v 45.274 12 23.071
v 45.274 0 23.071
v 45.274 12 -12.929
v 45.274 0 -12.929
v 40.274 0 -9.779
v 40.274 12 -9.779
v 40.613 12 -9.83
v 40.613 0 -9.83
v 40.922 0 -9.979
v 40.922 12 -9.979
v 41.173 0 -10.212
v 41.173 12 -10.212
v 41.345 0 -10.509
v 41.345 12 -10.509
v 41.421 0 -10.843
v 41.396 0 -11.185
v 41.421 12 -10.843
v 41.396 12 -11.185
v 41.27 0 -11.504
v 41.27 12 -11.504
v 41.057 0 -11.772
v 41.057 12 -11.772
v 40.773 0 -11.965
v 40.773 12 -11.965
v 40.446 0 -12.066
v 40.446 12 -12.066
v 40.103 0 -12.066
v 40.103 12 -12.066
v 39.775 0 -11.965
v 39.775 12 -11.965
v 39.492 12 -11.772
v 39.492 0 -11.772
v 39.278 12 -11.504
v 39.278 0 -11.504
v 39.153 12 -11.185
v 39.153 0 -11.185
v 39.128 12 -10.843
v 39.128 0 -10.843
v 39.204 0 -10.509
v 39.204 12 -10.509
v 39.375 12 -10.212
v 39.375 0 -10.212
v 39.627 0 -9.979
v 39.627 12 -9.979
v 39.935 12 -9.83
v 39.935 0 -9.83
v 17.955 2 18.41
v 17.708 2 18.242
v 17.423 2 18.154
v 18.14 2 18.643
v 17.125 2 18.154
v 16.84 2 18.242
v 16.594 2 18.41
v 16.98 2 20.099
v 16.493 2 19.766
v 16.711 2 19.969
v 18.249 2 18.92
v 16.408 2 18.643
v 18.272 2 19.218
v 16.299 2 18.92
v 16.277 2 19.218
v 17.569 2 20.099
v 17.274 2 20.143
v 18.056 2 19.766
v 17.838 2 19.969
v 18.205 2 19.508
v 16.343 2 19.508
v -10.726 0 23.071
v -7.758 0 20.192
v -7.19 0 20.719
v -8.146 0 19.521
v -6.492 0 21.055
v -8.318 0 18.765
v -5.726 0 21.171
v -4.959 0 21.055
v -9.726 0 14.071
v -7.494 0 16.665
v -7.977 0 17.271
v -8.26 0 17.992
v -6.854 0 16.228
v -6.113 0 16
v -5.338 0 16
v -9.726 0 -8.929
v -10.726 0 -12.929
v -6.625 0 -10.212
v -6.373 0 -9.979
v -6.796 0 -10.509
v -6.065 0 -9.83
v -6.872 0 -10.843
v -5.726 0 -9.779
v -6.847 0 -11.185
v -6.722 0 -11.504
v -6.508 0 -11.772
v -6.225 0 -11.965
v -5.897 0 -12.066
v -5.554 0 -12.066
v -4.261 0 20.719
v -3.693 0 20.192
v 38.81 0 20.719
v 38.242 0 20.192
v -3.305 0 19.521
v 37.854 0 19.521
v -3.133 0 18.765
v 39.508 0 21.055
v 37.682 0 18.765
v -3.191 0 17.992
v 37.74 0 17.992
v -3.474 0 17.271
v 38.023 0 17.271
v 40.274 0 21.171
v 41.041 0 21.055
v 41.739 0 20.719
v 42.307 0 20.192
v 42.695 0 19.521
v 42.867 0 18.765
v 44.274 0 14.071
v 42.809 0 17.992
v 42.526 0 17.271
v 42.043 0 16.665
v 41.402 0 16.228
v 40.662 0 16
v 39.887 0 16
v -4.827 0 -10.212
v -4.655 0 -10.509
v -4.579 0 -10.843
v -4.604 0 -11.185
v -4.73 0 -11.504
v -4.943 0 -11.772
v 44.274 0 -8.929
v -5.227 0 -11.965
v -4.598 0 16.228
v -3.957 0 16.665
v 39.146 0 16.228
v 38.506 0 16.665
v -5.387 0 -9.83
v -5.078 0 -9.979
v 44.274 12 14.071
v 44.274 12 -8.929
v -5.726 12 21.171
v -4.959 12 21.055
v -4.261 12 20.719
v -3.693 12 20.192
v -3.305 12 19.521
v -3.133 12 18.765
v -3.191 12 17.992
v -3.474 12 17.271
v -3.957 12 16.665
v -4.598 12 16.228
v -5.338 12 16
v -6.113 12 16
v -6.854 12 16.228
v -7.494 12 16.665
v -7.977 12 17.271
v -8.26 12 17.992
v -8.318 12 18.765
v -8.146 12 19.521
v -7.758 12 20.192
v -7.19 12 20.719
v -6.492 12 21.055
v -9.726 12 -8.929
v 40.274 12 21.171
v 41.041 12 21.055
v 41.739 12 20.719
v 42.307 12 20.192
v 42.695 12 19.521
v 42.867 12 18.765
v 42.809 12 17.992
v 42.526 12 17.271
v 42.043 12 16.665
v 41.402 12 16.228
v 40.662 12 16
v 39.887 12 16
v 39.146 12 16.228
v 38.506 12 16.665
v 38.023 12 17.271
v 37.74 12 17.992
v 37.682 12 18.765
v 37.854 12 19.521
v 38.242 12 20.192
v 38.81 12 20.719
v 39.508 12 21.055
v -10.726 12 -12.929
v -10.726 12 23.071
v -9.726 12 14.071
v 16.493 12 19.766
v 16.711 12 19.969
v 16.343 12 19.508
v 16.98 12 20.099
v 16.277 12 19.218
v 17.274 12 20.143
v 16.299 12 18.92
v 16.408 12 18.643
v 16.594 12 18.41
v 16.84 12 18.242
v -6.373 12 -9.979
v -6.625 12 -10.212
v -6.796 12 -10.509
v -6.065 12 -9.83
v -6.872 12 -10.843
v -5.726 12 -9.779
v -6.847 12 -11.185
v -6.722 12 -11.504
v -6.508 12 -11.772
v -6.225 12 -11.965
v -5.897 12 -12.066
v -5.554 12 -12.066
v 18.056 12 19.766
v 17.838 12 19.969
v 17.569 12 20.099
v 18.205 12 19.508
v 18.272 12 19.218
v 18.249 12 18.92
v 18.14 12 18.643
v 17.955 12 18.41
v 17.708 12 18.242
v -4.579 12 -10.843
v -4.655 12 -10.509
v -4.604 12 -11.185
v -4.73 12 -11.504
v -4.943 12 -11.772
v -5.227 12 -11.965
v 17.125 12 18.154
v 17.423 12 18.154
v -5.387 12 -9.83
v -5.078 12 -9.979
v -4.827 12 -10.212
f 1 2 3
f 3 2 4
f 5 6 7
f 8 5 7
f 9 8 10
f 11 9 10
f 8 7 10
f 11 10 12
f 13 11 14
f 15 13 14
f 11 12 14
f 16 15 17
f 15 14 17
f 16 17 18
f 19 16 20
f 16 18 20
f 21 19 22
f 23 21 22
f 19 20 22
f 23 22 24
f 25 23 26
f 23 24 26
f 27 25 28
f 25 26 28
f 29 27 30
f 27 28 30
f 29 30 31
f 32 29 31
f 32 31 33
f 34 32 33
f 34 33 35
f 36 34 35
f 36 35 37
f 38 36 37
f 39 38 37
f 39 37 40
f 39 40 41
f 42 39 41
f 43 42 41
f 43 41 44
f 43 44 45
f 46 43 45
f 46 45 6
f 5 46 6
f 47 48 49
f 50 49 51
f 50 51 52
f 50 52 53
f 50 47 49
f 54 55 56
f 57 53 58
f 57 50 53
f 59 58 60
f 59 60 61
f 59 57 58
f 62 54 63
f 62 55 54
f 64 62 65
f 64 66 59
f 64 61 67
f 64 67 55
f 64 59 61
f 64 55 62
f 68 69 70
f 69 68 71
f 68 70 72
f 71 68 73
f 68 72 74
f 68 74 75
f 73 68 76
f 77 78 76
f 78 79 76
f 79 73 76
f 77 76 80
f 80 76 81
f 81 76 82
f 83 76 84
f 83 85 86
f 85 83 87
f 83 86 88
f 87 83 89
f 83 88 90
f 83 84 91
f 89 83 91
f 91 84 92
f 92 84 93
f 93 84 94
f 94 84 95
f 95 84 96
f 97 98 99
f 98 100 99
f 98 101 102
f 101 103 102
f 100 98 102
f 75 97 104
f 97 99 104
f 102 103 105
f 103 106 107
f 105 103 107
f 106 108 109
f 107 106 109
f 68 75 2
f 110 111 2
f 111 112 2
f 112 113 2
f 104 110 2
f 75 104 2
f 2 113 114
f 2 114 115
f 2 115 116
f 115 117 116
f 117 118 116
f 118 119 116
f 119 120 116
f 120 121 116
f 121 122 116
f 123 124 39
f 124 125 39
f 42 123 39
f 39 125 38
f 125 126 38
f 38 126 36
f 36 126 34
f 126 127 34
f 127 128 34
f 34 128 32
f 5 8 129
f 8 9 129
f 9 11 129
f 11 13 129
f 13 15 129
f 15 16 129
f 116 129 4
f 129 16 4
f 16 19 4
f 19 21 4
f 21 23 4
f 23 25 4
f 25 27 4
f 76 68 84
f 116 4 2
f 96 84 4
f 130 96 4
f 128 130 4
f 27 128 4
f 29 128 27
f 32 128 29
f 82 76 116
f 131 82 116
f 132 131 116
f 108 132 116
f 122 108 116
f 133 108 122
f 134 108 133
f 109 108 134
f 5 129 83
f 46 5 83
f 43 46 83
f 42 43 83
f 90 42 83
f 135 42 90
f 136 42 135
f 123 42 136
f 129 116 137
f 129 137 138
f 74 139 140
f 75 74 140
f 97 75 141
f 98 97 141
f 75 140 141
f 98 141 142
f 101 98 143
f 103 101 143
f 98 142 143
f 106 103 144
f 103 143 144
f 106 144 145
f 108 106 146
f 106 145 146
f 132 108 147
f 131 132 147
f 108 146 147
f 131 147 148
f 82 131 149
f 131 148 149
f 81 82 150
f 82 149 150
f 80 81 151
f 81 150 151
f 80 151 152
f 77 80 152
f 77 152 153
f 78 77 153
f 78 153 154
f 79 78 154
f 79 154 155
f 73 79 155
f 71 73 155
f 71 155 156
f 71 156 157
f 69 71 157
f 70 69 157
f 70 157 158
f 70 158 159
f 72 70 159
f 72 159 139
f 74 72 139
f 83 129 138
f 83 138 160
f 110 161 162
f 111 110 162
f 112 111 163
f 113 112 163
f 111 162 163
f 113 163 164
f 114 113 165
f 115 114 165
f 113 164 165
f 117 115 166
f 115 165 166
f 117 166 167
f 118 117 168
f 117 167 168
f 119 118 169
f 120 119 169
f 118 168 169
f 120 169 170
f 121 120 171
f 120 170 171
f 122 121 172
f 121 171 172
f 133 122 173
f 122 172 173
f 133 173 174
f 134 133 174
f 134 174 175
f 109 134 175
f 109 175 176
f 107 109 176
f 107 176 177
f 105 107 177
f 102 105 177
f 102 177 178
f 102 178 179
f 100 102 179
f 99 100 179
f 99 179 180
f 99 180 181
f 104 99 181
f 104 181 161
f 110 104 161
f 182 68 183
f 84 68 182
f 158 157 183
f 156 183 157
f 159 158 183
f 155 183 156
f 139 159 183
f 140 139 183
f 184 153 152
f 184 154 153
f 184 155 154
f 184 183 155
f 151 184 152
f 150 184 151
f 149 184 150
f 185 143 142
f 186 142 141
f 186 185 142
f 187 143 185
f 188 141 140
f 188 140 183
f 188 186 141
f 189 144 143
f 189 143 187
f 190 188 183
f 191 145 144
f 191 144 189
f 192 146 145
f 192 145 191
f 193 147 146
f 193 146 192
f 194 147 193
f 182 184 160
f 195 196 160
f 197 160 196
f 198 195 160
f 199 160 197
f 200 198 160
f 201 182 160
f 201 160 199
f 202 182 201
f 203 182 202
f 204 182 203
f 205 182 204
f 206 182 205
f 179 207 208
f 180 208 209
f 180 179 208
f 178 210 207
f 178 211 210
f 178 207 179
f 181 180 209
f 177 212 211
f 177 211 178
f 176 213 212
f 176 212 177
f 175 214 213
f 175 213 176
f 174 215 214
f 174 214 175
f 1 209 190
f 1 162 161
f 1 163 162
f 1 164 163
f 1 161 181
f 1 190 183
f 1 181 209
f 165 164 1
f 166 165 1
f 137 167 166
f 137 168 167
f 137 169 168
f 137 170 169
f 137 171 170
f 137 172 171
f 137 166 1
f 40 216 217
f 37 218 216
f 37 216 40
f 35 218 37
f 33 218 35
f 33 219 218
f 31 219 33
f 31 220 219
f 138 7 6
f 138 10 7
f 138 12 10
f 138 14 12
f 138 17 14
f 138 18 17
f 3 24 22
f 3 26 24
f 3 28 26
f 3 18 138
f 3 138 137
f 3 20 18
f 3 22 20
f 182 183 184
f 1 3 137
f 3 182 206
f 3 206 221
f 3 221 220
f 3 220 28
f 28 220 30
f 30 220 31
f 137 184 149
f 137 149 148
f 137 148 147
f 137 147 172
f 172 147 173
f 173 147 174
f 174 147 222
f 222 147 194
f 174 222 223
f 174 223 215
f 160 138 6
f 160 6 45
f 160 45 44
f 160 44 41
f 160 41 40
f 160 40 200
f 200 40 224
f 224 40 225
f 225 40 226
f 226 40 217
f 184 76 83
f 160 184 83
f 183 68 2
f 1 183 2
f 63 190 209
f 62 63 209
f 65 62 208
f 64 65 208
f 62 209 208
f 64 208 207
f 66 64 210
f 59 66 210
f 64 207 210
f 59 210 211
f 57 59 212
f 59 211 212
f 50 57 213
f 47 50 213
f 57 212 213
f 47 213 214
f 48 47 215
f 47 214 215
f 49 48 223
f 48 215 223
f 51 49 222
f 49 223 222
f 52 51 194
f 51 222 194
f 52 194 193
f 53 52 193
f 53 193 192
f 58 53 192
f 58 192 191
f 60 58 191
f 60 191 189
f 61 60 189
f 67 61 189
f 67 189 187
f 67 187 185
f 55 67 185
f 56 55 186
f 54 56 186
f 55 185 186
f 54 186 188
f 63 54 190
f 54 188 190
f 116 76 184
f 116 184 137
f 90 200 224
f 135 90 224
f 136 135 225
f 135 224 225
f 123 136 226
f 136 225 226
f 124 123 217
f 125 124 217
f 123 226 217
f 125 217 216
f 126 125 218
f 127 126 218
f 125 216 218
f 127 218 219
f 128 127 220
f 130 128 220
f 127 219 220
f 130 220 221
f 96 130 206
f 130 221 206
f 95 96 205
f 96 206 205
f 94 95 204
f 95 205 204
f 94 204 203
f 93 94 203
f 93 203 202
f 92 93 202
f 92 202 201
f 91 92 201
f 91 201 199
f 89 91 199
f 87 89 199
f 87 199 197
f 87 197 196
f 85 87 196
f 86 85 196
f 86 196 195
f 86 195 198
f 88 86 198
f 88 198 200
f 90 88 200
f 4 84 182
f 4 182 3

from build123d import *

# Parameters (mm, degrees)
EXTRUDE_1_DEPTH     = 12
SKETCH_4_W          = 56
SKETCH_4_H          = 3
SKETCH_4_H_2        = 1
EXTRUDE_2_DEPTH     = 12
SKETCH_5_R          = 1.15
SKETCH_5_R_2        = 2.6
CUT_EXTRUDE_2_DEPTH = 53.211370172
SKETCH_7_R          = 1
CUT_EXTRUDE_3_DEPTH = 10


with BuildPart() as part:
    # 草图2 → 凸台-拉伸1 (new body)
    with BuildSketch(Plane(origin=(0, 0, 0), x_dir=(1, 0, 0), z_dir=(0, 1, 0))):
        Polygon((-10.725663717, 9.92920354), (45.274336283, 9.92920354), (45.274336283, -22.07079646), (-10.725663717, -22.07079646), (-10.725663717, -7.07079646), (-10.725663717, 1.92920354), align=None)
        Polygon((-9.725663717, -7.07079646), (-9.725663717, -14.07079646), (44.274336283, -14.07079646), (44.274336283, 8.92920354), (-9.725663717, 8.92920354), (-9.725663717, 0.92920354), align=None, mode=Mode.SUBTRACT)
    extrude(amount=EXTRUDE_1_DEPTH)

    # 草图4 → 凸台-拉伸2 (add)
    with BuildSketch(Plane(origin=(0, 0, 0), x_dir=(1, 0, 0), z_dir=(0, 1, 0))):
        with Locations((17.274336283, 11.42920354)):
            Rectangle(SKETCH_4_W, SKETCH_4_H)
        with Locations((17.274336283, -22.57079646)):
            Rectangle(SKETCH_4_W, SKETCH_4_H_2)
    extrude(amount=EXTRUDE_2_DEPTH)

    # 草图5 → 切除-拉伸2 (cut, through all)
    with BuildSketch(Plane(origin=(0, 12, 0), x_dir=(1, 0, 0), z_dir=(0, 1, 0))):
        with Locations(Location((-5.725663717, 10.92920354, 0), (0, 0, 270))):
            Circle(SKETCH_5_R)
        with Locations(Location((40.274336283, 10.92920354, 0), (0, 0, 270))):
            Circle(SKETCH_5_R)
        with Locations(Location((-5.725663717, -18.57079646, 0), (0, 0, 270))):
            Circle(SKETCH_5_R_2)
        with Locations(Location((40.274336283, -18.57079646, 0), (0, 0, 270))):
            Circle(SKETCH_5_R_2)
    extrude(amount=-CUT_EXTRUDE_2_DEPTH, mode=Mode.SUBTRACT)

    # 草图7 → 切除-拉伸3 (cut)
    with BuildSketch(Plane(origin=(0, 12, 0), x_dir=(1, 0, 0), z_dir=(0, 1, 0))):
        with Locations(Location((17.274336283, -19.142973174, 0), (0, 0, 270))):
            Circle(SKETCH_7_R)
    extrude(amount=-CUT_EXTRUDE_3_DEPTH, mode=Mode.SUBTRACT)


solid = part.part
